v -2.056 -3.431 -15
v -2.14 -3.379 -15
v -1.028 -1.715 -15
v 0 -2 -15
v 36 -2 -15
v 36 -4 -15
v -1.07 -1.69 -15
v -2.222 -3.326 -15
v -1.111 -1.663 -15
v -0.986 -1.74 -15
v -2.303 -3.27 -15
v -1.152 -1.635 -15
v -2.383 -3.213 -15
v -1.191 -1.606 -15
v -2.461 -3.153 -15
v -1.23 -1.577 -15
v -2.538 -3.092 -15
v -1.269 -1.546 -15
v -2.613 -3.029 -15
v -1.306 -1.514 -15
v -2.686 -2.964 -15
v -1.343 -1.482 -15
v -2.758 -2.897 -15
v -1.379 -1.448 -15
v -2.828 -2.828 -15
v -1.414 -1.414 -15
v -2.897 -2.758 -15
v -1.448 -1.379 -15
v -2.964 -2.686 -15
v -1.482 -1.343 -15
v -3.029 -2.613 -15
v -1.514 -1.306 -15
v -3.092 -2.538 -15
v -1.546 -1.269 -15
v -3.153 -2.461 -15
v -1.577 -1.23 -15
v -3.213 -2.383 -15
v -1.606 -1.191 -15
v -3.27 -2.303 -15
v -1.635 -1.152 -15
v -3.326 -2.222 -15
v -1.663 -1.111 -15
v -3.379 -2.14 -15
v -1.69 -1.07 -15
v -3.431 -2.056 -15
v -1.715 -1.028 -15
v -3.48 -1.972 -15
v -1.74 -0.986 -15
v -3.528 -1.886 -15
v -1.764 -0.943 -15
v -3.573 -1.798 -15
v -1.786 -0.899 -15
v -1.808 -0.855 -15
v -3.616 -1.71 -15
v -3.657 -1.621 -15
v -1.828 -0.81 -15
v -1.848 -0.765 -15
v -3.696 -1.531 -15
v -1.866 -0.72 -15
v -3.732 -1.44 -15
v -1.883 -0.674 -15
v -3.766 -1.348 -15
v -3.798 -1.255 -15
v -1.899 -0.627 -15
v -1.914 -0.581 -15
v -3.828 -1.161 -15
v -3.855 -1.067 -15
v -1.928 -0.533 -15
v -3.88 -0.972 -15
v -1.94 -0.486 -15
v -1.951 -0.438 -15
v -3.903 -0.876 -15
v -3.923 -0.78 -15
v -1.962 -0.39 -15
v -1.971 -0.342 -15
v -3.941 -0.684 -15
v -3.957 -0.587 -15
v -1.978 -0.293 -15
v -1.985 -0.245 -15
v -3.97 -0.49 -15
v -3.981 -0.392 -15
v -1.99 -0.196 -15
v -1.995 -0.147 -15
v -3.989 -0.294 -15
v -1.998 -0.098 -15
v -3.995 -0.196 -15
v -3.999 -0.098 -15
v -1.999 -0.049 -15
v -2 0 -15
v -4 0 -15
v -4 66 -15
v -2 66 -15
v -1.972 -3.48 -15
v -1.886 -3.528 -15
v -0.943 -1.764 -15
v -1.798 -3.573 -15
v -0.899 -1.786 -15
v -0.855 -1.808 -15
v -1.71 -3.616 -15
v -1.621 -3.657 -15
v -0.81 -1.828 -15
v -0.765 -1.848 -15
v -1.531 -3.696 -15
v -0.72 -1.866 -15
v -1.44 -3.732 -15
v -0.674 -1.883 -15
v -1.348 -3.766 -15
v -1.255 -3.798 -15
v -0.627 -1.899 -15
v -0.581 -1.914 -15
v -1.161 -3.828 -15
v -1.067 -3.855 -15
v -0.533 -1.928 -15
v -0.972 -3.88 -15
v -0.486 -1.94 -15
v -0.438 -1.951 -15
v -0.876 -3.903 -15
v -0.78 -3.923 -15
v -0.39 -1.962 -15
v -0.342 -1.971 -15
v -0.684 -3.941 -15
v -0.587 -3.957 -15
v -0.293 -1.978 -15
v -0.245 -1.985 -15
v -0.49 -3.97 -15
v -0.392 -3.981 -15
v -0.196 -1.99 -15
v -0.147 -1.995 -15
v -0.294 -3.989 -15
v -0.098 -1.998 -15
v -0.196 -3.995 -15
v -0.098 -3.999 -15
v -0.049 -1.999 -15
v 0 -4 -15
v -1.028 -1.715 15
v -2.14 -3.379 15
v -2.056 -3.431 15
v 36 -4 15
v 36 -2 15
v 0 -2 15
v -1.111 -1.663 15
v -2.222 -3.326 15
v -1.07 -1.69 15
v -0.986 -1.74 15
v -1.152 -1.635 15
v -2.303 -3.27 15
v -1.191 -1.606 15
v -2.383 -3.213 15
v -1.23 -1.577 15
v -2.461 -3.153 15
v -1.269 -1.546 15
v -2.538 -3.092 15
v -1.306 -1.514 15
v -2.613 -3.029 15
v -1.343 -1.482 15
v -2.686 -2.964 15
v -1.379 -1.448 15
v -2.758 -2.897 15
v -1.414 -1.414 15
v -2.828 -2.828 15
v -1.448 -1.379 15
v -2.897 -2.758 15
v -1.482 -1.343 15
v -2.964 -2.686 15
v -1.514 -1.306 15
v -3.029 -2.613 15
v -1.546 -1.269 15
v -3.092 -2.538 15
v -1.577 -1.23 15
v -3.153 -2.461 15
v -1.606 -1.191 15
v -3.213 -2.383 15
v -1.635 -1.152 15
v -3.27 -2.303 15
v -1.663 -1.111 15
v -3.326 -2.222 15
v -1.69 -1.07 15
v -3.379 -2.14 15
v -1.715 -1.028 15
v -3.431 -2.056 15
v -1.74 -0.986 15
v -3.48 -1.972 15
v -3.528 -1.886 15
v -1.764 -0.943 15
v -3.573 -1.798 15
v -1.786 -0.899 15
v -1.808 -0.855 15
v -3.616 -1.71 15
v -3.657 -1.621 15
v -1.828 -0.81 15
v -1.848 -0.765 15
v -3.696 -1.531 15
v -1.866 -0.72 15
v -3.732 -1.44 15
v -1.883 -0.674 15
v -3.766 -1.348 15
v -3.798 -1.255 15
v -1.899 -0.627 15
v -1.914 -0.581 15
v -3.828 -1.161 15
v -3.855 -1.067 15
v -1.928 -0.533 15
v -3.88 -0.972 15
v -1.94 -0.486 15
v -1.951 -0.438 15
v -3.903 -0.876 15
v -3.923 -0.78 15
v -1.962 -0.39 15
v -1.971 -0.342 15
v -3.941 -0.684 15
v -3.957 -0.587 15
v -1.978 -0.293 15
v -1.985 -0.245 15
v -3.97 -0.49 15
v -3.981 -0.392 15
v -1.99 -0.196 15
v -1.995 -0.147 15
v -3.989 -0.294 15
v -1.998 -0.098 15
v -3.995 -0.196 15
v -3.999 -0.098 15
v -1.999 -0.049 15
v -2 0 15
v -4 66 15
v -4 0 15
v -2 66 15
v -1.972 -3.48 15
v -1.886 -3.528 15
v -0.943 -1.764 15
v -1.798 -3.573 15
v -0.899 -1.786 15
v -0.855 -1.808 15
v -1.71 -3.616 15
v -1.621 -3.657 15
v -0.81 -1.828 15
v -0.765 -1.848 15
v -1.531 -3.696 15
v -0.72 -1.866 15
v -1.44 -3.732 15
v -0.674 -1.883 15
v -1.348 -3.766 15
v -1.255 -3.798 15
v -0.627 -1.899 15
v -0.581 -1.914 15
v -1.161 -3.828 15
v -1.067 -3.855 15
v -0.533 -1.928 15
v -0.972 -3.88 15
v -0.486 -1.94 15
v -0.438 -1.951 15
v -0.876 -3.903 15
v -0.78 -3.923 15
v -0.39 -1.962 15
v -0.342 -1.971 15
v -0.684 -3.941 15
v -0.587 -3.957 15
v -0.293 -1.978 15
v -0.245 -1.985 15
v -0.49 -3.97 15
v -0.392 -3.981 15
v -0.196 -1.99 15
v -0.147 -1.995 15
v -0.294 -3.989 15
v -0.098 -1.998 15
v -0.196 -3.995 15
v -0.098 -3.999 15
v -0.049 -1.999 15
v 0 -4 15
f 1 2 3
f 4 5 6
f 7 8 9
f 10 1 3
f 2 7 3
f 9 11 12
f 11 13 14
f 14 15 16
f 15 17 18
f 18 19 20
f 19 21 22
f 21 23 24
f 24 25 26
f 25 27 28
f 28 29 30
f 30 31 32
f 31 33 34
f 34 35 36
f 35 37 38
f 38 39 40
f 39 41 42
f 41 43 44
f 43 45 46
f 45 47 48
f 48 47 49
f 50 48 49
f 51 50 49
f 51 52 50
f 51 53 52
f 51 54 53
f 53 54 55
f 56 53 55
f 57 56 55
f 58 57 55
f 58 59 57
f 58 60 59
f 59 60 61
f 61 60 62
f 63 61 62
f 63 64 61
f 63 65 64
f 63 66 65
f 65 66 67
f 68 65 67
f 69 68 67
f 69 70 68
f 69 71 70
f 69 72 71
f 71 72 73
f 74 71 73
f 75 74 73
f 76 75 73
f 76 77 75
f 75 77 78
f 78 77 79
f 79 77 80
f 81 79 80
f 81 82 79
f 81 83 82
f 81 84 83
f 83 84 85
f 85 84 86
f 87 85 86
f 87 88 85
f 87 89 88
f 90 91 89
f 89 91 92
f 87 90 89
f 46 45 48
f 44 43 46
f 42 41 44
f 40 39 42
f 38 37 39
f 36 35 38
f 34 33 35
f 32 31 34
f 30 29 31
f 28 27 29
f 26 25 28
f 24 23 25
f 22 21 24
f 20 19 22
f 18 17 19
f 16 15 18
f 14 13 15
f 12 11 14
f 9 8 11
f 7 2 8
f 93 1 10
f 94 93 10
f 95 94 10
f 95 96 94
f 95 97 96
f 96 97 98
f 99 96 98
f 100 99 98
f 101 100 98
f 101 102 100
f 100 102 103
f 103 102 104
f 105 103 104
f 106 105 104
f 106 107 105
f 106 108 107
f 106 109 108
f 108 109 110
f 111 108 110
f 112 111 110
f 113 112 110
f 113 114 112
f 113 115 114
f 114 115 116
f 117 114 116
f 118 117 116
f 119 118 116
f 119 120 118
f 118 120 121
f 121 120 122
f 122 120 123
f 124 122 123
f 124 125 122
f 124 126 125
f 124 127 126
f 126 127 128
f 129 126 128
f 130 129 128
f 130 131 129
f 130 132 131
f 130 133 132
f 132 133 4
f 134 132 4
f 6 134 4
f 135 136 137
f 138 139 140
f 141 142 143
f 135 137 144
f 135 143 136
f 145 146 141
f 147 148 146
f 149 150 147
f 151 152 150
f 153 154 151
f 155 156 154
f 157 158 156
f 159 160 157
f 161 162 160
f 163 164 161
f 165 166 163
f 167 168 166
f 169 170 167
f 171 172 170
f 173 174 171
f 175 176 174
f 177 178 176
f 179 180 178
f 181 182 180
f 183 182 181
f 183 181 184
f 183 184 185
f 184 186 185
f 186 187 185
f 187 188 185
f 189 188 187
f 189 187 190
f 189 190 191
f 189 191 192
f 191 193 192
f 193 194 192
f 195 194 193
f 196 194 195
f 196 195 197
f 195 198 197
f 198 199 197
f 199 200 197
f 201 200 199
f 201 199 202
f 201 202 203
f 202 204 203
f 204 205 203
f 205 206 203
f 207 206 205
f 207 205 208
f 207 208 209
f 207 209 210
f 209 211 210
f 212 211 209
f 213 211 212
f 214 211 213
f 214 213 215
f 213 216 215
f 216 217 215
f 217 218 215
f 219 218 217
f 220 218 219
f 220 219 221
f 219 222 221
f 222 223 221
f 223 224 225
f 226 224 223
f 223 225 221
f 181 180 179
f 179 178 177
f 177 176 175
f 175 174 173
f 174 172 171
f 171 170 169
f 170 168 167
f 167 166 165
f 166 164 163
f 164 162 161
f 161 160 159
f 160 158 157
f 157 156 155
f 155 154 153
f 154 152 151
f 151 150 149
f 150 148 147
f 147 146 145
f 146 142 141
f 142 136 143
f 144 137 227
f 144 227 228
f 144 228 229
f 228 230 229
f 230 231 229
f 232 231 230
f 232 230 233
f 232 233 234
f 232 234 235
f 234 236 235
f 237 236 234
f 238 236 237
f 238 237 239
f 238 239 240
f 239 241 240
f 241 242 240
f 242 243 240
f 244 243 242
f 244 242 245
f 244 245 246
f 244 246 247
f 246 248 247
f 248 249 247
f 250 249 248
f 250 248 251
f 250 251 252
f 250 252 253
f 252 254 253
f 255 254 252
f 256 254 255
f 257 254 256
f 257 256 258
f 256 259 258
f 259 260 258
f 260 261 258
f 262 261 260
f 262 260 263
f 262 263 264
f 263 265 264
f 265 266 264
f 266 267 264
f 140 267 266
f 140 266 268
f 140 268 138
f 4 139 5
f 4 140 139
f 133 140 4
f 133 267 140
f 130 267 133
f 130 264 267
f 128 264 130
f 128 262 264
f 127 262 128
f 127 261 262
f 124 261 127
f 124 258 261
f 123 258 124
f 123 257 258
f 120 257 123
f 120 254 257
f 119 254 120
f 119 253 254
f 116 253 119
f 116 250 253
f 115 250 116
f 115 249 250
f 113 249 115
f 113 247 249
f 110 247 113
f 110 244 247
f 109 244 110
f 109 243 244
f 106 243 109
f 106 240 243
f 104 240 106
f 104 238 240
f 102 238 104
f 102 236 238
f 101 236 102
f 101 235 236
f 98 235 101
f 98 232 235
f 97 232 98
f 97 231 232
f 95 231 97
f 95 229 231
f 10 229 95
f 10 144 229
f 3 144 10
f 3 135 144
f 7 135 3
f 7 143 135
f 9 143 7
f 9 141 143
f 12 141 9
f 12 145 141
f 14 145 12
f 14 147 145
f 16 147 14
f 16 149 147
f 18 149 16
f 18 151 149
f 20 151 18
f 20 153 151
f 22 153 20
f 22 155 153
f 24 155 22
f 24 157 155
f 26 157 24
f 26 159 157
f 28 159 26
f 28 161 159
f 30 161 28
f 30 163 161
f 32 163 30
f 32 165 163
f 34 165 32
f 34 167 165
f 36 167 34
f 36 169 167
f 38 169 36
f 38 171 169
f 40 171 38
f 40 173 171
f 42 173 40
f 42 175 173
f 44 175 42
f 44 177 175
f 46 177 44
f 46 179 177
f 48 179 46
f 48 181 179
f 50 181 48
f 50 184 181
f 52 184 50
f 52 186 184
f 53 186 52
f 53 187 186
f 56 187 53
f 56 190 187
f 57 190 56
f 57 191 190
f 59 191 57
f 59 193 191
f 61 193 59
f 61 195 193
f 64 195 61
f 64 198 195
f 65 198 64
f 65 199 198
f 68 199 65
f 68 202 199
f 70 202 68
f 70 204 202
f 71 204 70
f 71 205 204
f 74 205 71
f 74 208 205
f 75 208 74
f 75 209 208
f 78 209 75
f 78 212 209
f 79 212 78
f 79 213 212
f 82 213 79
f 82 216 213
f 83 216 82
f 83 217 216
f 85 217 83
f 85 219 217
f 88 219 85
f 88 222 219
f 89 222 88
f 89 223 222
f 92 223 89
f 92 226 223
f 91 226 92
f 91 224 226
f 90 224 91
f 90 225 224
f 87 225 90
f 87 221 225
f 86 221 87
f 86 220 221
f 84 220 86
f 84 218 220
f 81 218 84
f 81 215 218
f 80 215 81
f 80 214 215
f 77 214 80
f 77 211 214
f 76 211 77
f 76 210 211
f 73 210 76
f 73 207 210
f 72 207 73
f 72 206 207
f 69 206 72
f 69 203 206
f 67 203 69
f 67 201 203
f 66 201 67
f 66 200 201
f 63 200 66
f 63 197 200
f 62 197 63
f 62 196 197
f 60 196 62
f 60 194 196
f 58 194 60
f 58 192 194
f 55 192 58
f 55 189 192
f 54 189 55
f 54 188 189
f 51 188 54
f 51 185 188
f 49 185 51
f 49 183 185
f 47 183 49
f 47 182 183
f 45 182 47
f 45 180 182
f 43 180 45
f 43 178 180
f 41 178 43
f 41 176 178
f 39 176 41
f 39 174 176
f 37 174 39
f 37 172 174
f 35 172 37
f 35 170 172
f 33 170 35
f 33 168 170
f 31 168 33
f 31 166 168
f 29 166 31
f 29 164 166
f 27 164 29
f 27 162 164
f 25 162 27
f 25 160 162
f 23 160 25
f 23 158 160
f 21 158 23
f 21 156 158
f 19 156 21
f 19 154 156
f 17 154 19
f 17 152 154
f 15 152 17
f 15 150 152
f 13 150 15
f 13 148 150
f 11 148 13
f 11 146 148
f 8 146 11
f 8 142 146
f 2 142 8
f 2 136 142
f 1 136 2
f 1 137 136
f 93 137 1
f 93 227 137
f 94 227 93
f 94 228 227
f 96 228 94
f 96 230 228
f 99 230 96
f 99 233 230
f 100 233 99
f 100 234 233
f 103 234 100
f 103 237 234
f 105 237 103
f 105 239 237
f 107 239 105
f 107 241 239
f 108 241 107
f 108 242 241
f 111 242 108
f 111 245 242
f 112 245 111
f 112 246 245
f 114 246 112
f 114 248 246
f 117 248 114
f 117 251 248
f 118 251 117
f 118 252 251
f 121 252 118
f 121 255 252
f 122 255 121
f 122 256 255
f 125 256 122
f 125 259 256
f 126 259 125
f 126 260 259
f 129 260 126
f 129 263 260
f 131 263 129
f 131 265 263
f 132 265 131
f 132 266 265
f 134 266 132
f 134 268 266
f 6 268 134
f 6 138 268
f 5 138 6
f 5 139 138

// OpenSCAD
// MAKERBENCH SHEET-METAL L-BRACKET
// Designed for manufacturing with constant sheet thickness and precise bend allowance.

// --- Design Parameters ---
thickness = 2.0;       // Sheet metal thickness (T)
inside_radius = 2.0;   // Inside bend radius (Ri)
width = 30.0;          // Width of the bracket
L1_outside = 70.0;     // Outside length of Flange 1
L2_outside = 40.0;     // Outside length of Flange 2
k_factor = 0.45;       // K-factor for bend allowance calculation

// --- Calculations for Flat Pattern (Developed Length) ---
outside_radius = inside_radius + thickness;
leg1 = L1_outside - outside_radius;
leg2 = L2_outside - outside_radius;

// Bend Allowance (BA) for 90-degree bend:
// BA = (angle_rad) * (Ri + K * T)
angle_rad = 90 * PI / 180;
bend_allowance = angle_rad * (inside_radius + k_factor * thickness);
flat_length = leg1 + leg2 + bend_allowance;

// --- Echo Manifest for DFM/ERP Systems ---
echo(str("MAKERBENCH-SHEETMETAL: {\"thickness_mm\": ", thickness, ", \"bend_radius_mm\": ", inside_radius, ", \"flat_length_mm\": ", flat_length, "}"));

// --- 3D Model Generation ---
$fn = 64; // High resolution for smooth bends

module l_bracket_profile() {
    Ri = inside_radius;
    Ro = outside_radius;
    
    // Generate inner bend arc points (180 to 270 degrees)
    inner_arc = [ for (i = [0 : $fn]) let(a = 180 + 90 * i / $fn) [Ri * cos(a), Ri * sin(a)] ];
    
    // Generate outer bend arc points (270 down to 180 degrees)
    outer_arc = [ for (i = [0 : $fn]) let(a = 270 - 90 * i / $fn) [Ro * cos(a), Ro * sin(a)] ];
    
    // Define the full 2D cross-section profile
    points = concat(
        [[ -Ri, leg1 ]],        // End of Flange 1 (inner side)
        inner_arc,             // Inner radius curve
        [[ leg2, -Ri ]],        // Transition to Flange 2 (inner side)
        [[ leg2, -Ro ]],        // End of Flange 2 (outer side)
        outer_arc,             // Outer radius curve
        [[ -Ro, leg1 ]]         // Return to Flange 1 (outer side)
    );
    
    polygon(points);
}

// Extrude the 2D profile to the specified width
color("Silver") {
    linear_extrude(height = width, center = true) {
        l_bracket_profile();
    }
}
